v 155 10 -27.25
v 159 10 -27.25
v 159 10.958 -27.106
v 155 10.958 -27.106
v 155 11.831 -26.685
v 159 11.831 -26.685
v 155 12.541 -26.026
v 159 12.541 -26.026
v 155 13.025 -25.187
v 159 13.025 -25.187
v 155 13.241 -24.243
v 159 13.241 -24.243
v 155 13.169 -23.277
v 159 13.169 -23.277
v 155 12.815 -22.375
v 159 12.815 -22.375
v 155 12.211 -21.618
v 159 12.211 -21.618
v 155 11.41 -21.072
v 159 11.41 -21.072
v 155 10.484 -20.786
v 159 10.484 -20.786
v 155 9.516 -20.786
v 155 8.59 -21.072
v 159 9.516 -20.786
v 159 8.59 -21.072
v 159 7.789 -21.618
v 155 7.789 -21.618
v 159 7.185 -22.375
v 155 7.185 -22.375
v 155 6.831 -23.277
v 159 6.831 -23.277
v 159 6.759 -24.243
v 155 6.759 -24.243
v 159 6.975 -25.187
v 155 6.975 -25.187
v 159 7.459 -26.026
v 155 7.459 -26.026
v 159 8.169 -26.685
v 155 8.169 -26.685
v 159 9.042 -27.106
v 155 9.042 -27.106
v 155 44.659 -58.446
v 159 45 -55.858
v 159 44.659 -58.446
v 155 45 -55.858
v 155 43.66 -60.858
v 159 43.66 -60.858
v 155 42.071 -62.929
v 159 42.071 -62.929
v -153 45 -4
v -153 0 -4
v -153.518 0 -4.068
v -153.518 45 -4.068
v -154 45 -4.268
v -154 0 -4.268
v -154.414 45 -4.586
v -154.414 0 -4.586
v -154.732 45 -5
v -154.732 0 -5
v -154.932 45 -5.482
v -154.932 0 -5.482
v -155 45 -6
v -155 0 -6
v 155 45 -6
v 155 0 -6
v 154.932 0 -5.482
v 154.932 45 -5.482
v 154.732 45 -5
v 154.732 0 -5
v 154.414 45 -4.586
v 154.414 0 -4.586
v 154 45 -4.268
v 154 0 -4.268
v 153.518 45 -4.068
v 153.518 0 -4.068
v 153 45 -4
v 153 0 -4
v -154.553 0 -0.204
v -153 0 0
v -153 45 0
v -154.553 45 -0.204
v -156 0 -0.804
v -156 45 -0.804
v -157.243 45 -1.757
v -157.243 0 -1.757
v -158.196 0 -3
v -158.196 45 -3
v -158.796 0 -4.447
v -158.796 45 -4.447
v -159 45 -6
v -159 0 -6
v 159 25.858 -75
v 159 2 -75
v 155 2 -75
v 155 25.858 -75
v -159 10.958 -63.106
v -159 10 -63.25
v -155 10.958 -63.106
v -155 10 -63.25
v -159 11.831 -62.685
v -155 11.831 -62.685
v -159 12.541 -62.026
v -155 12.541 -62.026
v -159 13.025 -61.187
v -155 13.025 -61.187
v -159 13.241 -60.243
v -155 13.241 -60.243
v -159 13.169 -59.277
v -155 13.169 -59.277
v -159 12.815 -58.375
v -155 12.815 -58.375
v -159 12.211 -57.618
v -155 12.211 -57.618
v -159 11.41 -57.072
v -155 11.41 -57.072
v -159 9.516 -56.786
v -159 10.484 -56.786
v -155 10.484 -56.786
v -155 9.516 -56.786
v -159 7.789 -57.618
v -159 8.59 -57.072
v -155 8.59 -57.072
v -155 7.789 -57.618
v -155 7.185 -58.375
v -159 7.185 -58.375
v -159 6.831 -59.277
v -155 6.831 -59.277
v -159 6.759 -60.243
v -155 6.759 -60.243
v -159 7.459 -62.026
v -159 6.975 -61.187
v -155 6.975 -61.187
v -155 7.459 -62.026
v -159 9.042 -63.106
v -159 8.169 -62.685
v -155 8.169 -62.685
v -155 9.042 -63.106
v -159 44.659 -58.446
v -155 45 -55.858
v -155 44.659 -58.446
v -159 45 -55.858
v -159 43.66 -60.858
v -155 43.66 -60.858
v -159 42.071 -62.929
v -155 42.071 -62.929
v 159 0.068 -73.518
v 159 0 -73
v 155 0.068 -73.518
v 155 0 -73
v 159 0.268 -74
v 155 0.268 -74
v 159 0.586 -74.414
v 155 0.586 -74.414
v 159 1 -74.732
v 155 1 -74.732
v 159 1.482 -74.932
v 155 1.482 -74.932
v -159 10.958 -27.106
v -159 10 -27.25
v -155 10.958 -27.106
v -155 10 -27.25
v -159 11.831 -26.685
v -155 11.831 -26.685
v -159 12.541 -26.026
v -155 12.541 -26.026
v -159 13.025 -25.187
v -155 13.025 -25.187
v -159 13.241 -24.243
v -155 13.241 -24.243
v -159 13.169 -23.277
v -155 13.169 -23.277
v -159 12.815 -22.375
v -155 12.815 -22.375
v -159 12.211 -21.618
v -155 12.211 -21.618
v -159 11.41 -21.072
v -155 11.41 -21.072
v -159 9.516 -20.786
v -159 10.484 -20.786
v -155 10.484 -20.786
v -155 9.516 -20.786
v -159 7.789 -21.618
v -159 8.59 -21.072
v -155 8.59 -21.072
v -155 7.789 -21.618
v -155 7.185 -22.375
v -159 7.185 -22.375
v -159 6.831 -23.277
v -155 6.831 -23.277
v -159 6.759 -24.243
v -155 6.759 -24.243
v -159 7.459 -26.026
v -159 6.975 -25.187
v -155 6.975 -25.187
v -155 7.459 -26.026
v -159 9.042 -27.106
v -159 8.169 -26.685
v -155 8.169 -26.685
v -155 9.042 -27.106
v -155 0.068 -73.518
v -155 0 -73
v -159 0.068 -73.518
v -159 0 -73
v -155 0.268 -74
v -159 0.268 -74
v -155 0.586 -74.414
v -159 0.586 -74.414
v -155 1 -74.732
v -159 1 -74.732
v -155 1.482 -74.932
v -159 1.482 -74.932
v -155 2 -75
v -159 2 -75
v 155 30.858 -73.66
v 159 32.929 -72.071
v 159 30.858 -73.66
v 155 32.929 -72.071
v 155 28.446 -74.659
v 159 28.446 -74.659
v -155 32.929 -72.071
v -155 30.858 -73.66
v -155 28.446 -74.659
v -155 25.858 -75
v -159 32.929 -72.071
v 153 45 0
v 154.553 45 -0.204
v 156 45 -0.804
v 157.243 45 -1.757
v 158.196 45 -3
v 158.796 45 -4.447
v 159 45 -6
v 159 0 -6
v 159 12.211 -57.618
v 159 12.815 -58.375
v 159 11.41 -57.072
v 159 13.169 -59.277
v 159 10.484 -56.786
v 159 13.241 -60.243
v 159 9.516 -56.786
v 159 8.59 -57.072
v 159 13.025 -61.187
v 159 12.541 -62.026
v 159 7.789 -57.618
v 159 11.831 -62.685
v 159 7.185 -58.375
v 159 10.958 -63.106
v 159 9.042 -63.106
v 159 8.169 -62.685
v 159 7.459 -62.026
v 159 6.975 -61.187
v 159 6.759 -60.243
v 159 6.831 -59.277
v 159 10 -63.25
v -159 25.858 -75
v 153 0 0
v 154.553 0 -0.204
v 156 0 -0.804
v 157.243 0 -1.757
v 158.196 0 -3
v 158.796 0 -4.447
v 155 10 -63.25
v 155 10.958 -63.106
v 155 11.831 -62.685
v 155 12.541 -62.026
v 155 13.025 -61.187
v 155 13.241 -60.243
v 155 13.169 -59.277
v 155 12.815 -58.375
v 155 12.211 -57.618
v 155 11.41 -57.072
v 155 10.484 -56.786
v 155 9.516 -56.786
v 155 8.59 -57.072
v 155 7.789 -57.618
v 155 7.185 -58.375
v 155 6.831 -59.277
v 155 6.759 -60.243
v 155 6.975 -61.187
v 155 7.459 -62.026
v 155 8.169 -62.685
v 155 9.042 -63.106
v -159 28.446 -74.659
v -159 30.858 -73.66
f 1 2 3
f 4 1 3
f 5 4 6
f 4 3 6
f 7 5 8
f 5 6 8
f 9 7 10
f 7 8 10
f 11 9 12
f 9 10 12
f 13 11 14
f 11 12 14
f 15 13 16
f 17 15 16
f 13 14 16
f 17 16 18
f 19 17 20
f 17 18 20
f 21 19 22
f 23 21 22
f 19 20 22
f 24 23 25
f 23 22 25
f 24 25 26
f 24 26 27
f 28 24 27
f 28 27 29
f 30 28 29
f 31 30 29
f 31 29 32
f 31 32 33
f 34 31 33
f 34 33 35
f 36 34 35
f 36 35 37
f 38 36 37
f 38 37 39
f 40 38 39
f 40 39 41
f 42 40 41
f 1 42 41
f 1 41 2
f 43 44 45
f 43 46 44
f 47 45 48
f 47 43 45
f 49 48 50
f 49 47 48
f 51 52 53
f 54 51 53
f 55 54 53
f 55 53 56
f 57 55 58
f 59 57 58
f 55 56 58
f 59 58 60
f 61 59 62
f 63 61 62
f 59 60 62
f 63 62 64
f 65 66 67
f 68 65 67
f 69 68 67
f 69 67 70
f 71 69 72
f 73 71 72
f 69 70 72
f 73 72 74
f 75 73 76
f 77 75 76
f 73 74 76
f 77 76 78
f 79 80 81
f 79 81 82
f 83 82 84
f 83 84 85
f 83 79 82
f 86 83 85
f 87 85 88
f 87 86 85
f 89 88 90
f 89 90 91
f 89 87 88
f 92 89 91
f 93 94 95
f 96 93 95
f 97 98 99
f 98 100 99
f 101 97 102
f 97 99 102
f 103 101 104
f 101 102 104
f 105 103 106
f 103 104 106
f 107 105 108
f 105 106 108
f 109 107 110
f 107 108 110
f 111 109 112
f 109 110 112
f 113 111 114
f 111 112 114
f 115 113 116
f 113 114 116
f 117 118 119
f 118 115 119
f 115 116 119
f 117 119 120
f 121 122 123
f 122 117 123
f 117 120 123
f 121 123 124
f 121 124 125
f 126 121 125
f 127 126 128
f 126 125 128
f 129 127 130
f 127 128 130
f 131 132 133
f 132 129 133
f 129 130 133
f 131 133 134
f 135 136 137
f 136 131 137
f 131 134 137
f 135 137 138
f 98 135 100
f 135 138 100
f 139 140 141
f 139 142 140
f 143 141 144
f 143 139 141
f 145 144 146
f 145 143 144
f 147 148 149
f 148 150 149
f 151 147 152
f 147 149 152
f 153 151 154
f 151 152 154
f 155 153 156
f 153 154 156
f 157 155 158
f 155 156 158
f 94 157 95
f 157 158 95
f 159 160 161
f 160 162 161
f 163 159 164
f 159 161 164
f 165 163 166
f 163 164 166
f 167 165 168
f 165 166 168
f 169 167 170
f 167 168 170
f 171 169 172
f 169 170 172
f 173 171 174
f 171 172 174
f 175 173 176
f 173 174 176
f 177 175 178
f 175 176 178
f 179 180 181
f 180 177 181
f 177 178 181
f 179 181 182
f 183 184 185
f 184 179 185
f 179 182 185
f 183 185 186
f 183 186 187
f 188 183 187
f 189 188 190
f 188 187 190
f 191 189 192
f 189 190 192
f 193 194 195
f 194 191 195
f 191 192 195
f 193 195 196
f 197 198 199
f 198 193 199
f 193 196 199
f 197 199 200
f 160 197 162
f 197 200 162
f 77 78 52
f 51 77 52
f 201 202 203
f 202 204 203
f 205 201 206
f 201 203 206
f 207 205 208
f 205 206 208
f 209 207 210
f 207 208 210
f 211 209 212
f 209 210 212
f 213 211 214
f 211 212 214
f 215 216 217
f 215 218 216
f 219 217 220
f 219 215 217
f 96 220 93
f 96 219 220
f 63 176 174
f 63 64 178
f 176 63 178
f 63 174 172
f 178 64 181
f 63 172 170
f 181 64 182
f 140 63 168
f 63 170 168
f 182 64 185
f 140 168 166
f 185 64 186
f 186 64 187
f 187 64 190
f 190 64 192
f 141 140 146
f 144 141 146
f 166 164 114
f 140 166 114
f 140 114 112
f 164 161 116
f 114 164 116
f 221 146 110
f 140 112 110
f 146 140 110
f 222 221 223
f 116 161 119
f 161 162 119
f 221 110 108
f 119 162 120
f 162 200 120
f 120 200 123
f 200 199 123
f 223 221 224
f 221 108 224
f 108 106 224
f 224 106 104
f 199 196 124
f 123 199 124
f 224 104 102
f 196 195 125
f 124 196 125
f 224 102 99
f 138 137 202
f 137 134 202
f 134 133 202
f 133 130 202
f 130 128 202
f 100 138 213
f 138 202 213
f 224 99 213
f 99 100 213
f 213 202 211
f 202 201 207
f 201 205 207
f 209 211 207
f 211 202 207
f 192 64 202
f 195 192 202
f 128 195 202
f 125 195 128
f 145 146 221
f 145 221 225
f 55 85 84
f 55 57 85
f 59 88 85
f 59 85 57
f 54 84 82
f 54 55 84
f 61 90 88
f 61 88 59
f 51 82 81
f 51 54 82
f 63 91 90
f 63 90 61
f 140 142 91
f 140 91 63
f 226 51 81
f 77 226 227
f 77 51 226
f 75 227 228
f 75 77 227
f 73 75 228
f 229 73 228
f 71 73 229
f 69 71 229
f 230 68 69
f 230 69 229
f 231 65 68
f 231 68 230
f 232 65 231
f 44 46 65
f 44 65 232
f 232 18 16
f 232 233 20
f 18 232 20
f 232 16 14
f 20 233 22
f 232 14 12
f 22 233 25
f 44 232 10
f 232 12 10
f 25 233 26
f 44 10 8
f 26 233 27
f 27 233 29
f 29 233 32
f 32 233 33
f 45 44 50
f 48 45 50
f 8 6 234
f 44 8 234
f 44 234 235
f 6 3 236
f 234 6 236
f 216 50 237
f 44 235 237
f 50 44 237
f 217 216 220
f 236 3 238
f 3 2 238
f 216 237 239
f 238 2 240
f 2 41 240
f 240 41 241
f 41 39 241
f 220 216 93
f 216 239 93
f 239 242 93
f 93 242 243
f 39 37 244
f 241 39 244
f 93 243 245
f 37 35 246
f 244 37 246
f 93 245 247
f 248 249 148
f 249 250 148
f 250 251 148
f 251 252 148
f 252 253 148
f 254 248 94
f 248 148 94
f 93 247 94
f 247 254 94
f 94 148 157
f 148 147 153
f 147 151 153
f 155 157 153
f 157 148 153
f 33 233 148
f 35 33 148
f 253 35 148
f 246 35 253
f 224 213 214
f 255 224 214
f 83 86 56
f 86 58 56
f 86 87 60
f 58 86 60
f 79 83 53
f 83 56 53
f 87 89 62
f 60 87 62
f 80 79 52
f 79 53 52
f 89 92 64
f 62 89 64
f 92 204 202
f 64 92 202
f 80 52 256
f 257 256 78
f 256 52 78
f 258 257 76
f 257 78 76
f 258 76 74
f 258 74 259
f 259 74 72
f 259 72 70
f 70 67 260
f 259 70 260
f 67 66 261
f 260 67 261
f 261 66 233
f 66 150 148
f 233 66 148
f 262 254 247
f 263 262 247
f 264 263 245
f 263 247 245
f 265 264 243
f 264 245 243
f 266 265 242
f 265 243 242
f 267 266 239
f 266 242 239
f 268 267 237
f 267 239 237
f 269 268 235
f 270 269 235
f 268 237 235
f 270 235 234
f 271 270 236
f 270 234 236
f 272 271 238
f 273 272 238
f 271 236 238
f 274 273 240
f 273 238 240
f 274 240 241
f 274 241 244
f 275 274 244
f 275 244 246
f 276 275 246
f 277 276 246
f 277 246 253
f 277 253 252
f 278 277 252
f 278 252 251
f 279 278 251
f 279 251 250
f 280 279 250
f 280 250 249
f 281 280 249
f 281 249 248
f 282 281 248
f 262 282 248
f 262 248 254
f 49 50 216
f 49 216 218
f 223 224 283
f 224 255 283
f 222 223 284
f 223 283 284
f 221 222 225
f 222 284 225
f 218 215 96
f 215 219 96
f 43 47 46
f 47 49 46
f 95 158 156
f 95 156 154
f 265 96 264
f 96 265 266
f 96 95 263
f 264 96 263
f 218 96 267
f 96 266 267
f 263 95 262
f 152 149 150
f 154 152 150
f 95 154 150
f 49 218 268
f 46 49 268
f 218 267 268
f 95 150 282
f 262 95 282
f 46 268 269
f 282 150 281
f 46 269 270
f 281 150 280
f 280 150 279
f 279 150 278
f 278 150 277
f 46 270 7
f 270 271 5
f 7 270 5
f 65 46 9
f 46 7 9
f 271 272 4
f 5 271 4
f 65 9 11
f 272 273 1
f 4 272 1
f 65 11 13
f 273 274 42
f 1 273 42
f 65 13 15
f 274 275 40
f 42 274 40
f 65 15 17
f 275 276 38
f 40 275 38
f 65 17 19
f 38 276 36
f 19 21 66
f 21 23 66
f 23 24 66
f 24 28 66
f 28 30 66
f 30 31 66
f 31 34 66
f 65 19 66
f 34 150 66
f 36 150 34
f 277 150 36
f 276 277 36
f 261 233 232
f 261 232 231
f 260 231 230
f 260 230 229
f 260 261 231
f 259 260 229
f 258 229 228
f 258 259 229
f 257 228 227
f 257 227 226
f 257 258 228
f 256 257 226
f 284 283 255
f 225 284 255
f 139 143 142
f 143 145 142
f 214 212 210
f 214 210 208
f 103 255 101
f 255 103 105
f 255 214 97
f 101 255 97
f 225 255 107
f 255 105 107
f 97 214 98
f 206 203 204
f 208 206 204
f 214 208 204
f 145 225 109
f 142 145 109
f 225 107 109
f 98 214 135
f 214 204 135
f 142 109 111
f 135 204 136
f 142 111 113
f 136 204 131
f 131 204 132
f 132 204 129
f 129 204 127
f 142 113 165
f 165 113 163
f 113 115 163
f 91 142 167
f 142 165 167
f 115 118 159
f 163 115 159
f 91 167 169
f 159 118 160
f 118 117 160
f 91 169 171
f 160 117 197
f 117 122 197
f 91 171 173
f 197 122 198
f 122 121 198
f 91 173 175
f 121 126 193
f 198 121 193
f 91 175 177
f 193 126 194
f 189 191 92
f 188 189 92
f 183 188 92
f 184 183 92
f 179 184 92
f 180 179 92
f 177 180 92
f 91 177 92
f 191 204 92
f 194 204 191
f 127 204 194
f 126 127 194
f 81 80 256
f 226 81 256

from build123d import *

# Parameters (mm, degrees)
EXTRUDE_THIN1_DEPTH        = 45
CHAMFER1_SIZE              = 15
CONVERT_SOLID1_DEPTH       = 45
CONVERT_SOLID1_2_DEPTH     = 45
FILLET1_R                  = 2
FILLET2_R                  = 10
F_6_5_6_5_DIAMETER_HOLE1_D = 6.5
F_6_5_6_5_DIAMETER_HOLE2_D = 6.5


# Read off the part's stored shape, not the designer's step: Convert-Solid1
with BuildPart() as part:
    # Sketch1 → Extrude-Thin1 (new body)
    with BuildSketch(Plane(origin=(0, 0, 0), x_dir=(1, 0, 0), z_dir=(0, 1, 0))):
        Polygon((-159, 75), (-159, 0), (159, 0), (159, 75), (155, 75), (155, 4), (-155, 4), (-155, 75), align=None)
    extrude(amount=EXTRUDE_THIN1_DEPTH)

    # Chamfer1
    chamfer1_edges = [part.edges().sort_by_distance(p)[0] for p in [
        (-157, 45, -75),
        (157, 45, -75),
    ]]
    chamfer(chamfer1_edges, length=CHAMFER1_SIZE)

    # Convert-Solid1 outline → Convert-Solid1 (cut)
    with BuildSketch(Plane(origin=(0, 0, 0), x_dir=(1, 0, 0), z_dir=(0, 1, 0))):
        with BuildLine():
            Line((-159, 0), (-153, 0))
            ThreePointArc((-153, 0), (-157.242640687, 1.757359313), (-159, 6))
            Line((-159, 6), (-159, 0))
        make_face()
        with BuildLine():
            ThreePointArc((159, 6), (157.242640687, 1.757359313), (153, 0))
            Line((153, 0), (159, 0))
            Line((159, 0), (159, 6))
        make_face()
    extrude(amount=CONVERT_SOLID1_DEPTH, mode=Mode.SUBTRACT)

    # Convert-Solid1 2 outline → Convert-Solid1 2 (add)
    with BuildSketch(Plane(origin=(0, 0, 0), x_dir=(1, 0, 0), z_dir=(0, 1, 0))):
        with BuildLine():
            Line((-155, 4), (-153, 4))
            ThreePointArc((-153, 4), (-154.414213562, 4.585786438), (-155, 6))
            Line((-155, 6), (-155, 4))
        make_face()
        with BuildLine():
            ThreePointArc((155, 6), (154.414213562, 4.585786438), (153, 4))
            Line((153, 4), (155, 4))
            Line((155, 4), (155, 6))
        make_face()
    extrude(amount=CONVERT_SOLID1_2_DEPTH)

    # Fillet1
    fillet1_edges = [part.edges().sort_by_distance(p)[0] for p in [
        (157, 0, -75),
        (-157, 0, -75),
    ]]
    fillet(fillet1_edges, radius=FILLET1_R)

    # Fillet2
    fillet2_edges = [part.edges().sort_by_distance(p)[0] for p in [
        (157, 30, -75),
        (157, 45, -60),
        (-157, 45, -60),
        (-157, 30, -75),
    ]]
    fillet(fillet2_edges, radius=FILLET2_R)

    # Ø6.5 (6.5) Diameter Hole1 (through all)
    with Locations(Plane(origin=(-159, 22, -202.5), x_dir=(0, 0, 1), z_dir=(-1, 0, 0))):
        with Locations((-178.5, -12), (-142.5, -12), (142.5, -12), (178.5, -12)):
            Hole(F_6_5_6_5_DIAMETER_HOLE1_D / 2)

    # Ø6.5 (6.5) Diameter Hole2 (through all)
    with Locations(Plane(origin=(159, 22, -202.5), x_dir=(0, 0, -1), z_dir=(1, 0, 0))):
        with Locations((-178.5, -12), (-142.5, -12), (142.5, -12), (178.5, -12)):
            Hole(F_6_5_6_5_DIAMETER_HOLE2_D / 2)


solid = part.part
